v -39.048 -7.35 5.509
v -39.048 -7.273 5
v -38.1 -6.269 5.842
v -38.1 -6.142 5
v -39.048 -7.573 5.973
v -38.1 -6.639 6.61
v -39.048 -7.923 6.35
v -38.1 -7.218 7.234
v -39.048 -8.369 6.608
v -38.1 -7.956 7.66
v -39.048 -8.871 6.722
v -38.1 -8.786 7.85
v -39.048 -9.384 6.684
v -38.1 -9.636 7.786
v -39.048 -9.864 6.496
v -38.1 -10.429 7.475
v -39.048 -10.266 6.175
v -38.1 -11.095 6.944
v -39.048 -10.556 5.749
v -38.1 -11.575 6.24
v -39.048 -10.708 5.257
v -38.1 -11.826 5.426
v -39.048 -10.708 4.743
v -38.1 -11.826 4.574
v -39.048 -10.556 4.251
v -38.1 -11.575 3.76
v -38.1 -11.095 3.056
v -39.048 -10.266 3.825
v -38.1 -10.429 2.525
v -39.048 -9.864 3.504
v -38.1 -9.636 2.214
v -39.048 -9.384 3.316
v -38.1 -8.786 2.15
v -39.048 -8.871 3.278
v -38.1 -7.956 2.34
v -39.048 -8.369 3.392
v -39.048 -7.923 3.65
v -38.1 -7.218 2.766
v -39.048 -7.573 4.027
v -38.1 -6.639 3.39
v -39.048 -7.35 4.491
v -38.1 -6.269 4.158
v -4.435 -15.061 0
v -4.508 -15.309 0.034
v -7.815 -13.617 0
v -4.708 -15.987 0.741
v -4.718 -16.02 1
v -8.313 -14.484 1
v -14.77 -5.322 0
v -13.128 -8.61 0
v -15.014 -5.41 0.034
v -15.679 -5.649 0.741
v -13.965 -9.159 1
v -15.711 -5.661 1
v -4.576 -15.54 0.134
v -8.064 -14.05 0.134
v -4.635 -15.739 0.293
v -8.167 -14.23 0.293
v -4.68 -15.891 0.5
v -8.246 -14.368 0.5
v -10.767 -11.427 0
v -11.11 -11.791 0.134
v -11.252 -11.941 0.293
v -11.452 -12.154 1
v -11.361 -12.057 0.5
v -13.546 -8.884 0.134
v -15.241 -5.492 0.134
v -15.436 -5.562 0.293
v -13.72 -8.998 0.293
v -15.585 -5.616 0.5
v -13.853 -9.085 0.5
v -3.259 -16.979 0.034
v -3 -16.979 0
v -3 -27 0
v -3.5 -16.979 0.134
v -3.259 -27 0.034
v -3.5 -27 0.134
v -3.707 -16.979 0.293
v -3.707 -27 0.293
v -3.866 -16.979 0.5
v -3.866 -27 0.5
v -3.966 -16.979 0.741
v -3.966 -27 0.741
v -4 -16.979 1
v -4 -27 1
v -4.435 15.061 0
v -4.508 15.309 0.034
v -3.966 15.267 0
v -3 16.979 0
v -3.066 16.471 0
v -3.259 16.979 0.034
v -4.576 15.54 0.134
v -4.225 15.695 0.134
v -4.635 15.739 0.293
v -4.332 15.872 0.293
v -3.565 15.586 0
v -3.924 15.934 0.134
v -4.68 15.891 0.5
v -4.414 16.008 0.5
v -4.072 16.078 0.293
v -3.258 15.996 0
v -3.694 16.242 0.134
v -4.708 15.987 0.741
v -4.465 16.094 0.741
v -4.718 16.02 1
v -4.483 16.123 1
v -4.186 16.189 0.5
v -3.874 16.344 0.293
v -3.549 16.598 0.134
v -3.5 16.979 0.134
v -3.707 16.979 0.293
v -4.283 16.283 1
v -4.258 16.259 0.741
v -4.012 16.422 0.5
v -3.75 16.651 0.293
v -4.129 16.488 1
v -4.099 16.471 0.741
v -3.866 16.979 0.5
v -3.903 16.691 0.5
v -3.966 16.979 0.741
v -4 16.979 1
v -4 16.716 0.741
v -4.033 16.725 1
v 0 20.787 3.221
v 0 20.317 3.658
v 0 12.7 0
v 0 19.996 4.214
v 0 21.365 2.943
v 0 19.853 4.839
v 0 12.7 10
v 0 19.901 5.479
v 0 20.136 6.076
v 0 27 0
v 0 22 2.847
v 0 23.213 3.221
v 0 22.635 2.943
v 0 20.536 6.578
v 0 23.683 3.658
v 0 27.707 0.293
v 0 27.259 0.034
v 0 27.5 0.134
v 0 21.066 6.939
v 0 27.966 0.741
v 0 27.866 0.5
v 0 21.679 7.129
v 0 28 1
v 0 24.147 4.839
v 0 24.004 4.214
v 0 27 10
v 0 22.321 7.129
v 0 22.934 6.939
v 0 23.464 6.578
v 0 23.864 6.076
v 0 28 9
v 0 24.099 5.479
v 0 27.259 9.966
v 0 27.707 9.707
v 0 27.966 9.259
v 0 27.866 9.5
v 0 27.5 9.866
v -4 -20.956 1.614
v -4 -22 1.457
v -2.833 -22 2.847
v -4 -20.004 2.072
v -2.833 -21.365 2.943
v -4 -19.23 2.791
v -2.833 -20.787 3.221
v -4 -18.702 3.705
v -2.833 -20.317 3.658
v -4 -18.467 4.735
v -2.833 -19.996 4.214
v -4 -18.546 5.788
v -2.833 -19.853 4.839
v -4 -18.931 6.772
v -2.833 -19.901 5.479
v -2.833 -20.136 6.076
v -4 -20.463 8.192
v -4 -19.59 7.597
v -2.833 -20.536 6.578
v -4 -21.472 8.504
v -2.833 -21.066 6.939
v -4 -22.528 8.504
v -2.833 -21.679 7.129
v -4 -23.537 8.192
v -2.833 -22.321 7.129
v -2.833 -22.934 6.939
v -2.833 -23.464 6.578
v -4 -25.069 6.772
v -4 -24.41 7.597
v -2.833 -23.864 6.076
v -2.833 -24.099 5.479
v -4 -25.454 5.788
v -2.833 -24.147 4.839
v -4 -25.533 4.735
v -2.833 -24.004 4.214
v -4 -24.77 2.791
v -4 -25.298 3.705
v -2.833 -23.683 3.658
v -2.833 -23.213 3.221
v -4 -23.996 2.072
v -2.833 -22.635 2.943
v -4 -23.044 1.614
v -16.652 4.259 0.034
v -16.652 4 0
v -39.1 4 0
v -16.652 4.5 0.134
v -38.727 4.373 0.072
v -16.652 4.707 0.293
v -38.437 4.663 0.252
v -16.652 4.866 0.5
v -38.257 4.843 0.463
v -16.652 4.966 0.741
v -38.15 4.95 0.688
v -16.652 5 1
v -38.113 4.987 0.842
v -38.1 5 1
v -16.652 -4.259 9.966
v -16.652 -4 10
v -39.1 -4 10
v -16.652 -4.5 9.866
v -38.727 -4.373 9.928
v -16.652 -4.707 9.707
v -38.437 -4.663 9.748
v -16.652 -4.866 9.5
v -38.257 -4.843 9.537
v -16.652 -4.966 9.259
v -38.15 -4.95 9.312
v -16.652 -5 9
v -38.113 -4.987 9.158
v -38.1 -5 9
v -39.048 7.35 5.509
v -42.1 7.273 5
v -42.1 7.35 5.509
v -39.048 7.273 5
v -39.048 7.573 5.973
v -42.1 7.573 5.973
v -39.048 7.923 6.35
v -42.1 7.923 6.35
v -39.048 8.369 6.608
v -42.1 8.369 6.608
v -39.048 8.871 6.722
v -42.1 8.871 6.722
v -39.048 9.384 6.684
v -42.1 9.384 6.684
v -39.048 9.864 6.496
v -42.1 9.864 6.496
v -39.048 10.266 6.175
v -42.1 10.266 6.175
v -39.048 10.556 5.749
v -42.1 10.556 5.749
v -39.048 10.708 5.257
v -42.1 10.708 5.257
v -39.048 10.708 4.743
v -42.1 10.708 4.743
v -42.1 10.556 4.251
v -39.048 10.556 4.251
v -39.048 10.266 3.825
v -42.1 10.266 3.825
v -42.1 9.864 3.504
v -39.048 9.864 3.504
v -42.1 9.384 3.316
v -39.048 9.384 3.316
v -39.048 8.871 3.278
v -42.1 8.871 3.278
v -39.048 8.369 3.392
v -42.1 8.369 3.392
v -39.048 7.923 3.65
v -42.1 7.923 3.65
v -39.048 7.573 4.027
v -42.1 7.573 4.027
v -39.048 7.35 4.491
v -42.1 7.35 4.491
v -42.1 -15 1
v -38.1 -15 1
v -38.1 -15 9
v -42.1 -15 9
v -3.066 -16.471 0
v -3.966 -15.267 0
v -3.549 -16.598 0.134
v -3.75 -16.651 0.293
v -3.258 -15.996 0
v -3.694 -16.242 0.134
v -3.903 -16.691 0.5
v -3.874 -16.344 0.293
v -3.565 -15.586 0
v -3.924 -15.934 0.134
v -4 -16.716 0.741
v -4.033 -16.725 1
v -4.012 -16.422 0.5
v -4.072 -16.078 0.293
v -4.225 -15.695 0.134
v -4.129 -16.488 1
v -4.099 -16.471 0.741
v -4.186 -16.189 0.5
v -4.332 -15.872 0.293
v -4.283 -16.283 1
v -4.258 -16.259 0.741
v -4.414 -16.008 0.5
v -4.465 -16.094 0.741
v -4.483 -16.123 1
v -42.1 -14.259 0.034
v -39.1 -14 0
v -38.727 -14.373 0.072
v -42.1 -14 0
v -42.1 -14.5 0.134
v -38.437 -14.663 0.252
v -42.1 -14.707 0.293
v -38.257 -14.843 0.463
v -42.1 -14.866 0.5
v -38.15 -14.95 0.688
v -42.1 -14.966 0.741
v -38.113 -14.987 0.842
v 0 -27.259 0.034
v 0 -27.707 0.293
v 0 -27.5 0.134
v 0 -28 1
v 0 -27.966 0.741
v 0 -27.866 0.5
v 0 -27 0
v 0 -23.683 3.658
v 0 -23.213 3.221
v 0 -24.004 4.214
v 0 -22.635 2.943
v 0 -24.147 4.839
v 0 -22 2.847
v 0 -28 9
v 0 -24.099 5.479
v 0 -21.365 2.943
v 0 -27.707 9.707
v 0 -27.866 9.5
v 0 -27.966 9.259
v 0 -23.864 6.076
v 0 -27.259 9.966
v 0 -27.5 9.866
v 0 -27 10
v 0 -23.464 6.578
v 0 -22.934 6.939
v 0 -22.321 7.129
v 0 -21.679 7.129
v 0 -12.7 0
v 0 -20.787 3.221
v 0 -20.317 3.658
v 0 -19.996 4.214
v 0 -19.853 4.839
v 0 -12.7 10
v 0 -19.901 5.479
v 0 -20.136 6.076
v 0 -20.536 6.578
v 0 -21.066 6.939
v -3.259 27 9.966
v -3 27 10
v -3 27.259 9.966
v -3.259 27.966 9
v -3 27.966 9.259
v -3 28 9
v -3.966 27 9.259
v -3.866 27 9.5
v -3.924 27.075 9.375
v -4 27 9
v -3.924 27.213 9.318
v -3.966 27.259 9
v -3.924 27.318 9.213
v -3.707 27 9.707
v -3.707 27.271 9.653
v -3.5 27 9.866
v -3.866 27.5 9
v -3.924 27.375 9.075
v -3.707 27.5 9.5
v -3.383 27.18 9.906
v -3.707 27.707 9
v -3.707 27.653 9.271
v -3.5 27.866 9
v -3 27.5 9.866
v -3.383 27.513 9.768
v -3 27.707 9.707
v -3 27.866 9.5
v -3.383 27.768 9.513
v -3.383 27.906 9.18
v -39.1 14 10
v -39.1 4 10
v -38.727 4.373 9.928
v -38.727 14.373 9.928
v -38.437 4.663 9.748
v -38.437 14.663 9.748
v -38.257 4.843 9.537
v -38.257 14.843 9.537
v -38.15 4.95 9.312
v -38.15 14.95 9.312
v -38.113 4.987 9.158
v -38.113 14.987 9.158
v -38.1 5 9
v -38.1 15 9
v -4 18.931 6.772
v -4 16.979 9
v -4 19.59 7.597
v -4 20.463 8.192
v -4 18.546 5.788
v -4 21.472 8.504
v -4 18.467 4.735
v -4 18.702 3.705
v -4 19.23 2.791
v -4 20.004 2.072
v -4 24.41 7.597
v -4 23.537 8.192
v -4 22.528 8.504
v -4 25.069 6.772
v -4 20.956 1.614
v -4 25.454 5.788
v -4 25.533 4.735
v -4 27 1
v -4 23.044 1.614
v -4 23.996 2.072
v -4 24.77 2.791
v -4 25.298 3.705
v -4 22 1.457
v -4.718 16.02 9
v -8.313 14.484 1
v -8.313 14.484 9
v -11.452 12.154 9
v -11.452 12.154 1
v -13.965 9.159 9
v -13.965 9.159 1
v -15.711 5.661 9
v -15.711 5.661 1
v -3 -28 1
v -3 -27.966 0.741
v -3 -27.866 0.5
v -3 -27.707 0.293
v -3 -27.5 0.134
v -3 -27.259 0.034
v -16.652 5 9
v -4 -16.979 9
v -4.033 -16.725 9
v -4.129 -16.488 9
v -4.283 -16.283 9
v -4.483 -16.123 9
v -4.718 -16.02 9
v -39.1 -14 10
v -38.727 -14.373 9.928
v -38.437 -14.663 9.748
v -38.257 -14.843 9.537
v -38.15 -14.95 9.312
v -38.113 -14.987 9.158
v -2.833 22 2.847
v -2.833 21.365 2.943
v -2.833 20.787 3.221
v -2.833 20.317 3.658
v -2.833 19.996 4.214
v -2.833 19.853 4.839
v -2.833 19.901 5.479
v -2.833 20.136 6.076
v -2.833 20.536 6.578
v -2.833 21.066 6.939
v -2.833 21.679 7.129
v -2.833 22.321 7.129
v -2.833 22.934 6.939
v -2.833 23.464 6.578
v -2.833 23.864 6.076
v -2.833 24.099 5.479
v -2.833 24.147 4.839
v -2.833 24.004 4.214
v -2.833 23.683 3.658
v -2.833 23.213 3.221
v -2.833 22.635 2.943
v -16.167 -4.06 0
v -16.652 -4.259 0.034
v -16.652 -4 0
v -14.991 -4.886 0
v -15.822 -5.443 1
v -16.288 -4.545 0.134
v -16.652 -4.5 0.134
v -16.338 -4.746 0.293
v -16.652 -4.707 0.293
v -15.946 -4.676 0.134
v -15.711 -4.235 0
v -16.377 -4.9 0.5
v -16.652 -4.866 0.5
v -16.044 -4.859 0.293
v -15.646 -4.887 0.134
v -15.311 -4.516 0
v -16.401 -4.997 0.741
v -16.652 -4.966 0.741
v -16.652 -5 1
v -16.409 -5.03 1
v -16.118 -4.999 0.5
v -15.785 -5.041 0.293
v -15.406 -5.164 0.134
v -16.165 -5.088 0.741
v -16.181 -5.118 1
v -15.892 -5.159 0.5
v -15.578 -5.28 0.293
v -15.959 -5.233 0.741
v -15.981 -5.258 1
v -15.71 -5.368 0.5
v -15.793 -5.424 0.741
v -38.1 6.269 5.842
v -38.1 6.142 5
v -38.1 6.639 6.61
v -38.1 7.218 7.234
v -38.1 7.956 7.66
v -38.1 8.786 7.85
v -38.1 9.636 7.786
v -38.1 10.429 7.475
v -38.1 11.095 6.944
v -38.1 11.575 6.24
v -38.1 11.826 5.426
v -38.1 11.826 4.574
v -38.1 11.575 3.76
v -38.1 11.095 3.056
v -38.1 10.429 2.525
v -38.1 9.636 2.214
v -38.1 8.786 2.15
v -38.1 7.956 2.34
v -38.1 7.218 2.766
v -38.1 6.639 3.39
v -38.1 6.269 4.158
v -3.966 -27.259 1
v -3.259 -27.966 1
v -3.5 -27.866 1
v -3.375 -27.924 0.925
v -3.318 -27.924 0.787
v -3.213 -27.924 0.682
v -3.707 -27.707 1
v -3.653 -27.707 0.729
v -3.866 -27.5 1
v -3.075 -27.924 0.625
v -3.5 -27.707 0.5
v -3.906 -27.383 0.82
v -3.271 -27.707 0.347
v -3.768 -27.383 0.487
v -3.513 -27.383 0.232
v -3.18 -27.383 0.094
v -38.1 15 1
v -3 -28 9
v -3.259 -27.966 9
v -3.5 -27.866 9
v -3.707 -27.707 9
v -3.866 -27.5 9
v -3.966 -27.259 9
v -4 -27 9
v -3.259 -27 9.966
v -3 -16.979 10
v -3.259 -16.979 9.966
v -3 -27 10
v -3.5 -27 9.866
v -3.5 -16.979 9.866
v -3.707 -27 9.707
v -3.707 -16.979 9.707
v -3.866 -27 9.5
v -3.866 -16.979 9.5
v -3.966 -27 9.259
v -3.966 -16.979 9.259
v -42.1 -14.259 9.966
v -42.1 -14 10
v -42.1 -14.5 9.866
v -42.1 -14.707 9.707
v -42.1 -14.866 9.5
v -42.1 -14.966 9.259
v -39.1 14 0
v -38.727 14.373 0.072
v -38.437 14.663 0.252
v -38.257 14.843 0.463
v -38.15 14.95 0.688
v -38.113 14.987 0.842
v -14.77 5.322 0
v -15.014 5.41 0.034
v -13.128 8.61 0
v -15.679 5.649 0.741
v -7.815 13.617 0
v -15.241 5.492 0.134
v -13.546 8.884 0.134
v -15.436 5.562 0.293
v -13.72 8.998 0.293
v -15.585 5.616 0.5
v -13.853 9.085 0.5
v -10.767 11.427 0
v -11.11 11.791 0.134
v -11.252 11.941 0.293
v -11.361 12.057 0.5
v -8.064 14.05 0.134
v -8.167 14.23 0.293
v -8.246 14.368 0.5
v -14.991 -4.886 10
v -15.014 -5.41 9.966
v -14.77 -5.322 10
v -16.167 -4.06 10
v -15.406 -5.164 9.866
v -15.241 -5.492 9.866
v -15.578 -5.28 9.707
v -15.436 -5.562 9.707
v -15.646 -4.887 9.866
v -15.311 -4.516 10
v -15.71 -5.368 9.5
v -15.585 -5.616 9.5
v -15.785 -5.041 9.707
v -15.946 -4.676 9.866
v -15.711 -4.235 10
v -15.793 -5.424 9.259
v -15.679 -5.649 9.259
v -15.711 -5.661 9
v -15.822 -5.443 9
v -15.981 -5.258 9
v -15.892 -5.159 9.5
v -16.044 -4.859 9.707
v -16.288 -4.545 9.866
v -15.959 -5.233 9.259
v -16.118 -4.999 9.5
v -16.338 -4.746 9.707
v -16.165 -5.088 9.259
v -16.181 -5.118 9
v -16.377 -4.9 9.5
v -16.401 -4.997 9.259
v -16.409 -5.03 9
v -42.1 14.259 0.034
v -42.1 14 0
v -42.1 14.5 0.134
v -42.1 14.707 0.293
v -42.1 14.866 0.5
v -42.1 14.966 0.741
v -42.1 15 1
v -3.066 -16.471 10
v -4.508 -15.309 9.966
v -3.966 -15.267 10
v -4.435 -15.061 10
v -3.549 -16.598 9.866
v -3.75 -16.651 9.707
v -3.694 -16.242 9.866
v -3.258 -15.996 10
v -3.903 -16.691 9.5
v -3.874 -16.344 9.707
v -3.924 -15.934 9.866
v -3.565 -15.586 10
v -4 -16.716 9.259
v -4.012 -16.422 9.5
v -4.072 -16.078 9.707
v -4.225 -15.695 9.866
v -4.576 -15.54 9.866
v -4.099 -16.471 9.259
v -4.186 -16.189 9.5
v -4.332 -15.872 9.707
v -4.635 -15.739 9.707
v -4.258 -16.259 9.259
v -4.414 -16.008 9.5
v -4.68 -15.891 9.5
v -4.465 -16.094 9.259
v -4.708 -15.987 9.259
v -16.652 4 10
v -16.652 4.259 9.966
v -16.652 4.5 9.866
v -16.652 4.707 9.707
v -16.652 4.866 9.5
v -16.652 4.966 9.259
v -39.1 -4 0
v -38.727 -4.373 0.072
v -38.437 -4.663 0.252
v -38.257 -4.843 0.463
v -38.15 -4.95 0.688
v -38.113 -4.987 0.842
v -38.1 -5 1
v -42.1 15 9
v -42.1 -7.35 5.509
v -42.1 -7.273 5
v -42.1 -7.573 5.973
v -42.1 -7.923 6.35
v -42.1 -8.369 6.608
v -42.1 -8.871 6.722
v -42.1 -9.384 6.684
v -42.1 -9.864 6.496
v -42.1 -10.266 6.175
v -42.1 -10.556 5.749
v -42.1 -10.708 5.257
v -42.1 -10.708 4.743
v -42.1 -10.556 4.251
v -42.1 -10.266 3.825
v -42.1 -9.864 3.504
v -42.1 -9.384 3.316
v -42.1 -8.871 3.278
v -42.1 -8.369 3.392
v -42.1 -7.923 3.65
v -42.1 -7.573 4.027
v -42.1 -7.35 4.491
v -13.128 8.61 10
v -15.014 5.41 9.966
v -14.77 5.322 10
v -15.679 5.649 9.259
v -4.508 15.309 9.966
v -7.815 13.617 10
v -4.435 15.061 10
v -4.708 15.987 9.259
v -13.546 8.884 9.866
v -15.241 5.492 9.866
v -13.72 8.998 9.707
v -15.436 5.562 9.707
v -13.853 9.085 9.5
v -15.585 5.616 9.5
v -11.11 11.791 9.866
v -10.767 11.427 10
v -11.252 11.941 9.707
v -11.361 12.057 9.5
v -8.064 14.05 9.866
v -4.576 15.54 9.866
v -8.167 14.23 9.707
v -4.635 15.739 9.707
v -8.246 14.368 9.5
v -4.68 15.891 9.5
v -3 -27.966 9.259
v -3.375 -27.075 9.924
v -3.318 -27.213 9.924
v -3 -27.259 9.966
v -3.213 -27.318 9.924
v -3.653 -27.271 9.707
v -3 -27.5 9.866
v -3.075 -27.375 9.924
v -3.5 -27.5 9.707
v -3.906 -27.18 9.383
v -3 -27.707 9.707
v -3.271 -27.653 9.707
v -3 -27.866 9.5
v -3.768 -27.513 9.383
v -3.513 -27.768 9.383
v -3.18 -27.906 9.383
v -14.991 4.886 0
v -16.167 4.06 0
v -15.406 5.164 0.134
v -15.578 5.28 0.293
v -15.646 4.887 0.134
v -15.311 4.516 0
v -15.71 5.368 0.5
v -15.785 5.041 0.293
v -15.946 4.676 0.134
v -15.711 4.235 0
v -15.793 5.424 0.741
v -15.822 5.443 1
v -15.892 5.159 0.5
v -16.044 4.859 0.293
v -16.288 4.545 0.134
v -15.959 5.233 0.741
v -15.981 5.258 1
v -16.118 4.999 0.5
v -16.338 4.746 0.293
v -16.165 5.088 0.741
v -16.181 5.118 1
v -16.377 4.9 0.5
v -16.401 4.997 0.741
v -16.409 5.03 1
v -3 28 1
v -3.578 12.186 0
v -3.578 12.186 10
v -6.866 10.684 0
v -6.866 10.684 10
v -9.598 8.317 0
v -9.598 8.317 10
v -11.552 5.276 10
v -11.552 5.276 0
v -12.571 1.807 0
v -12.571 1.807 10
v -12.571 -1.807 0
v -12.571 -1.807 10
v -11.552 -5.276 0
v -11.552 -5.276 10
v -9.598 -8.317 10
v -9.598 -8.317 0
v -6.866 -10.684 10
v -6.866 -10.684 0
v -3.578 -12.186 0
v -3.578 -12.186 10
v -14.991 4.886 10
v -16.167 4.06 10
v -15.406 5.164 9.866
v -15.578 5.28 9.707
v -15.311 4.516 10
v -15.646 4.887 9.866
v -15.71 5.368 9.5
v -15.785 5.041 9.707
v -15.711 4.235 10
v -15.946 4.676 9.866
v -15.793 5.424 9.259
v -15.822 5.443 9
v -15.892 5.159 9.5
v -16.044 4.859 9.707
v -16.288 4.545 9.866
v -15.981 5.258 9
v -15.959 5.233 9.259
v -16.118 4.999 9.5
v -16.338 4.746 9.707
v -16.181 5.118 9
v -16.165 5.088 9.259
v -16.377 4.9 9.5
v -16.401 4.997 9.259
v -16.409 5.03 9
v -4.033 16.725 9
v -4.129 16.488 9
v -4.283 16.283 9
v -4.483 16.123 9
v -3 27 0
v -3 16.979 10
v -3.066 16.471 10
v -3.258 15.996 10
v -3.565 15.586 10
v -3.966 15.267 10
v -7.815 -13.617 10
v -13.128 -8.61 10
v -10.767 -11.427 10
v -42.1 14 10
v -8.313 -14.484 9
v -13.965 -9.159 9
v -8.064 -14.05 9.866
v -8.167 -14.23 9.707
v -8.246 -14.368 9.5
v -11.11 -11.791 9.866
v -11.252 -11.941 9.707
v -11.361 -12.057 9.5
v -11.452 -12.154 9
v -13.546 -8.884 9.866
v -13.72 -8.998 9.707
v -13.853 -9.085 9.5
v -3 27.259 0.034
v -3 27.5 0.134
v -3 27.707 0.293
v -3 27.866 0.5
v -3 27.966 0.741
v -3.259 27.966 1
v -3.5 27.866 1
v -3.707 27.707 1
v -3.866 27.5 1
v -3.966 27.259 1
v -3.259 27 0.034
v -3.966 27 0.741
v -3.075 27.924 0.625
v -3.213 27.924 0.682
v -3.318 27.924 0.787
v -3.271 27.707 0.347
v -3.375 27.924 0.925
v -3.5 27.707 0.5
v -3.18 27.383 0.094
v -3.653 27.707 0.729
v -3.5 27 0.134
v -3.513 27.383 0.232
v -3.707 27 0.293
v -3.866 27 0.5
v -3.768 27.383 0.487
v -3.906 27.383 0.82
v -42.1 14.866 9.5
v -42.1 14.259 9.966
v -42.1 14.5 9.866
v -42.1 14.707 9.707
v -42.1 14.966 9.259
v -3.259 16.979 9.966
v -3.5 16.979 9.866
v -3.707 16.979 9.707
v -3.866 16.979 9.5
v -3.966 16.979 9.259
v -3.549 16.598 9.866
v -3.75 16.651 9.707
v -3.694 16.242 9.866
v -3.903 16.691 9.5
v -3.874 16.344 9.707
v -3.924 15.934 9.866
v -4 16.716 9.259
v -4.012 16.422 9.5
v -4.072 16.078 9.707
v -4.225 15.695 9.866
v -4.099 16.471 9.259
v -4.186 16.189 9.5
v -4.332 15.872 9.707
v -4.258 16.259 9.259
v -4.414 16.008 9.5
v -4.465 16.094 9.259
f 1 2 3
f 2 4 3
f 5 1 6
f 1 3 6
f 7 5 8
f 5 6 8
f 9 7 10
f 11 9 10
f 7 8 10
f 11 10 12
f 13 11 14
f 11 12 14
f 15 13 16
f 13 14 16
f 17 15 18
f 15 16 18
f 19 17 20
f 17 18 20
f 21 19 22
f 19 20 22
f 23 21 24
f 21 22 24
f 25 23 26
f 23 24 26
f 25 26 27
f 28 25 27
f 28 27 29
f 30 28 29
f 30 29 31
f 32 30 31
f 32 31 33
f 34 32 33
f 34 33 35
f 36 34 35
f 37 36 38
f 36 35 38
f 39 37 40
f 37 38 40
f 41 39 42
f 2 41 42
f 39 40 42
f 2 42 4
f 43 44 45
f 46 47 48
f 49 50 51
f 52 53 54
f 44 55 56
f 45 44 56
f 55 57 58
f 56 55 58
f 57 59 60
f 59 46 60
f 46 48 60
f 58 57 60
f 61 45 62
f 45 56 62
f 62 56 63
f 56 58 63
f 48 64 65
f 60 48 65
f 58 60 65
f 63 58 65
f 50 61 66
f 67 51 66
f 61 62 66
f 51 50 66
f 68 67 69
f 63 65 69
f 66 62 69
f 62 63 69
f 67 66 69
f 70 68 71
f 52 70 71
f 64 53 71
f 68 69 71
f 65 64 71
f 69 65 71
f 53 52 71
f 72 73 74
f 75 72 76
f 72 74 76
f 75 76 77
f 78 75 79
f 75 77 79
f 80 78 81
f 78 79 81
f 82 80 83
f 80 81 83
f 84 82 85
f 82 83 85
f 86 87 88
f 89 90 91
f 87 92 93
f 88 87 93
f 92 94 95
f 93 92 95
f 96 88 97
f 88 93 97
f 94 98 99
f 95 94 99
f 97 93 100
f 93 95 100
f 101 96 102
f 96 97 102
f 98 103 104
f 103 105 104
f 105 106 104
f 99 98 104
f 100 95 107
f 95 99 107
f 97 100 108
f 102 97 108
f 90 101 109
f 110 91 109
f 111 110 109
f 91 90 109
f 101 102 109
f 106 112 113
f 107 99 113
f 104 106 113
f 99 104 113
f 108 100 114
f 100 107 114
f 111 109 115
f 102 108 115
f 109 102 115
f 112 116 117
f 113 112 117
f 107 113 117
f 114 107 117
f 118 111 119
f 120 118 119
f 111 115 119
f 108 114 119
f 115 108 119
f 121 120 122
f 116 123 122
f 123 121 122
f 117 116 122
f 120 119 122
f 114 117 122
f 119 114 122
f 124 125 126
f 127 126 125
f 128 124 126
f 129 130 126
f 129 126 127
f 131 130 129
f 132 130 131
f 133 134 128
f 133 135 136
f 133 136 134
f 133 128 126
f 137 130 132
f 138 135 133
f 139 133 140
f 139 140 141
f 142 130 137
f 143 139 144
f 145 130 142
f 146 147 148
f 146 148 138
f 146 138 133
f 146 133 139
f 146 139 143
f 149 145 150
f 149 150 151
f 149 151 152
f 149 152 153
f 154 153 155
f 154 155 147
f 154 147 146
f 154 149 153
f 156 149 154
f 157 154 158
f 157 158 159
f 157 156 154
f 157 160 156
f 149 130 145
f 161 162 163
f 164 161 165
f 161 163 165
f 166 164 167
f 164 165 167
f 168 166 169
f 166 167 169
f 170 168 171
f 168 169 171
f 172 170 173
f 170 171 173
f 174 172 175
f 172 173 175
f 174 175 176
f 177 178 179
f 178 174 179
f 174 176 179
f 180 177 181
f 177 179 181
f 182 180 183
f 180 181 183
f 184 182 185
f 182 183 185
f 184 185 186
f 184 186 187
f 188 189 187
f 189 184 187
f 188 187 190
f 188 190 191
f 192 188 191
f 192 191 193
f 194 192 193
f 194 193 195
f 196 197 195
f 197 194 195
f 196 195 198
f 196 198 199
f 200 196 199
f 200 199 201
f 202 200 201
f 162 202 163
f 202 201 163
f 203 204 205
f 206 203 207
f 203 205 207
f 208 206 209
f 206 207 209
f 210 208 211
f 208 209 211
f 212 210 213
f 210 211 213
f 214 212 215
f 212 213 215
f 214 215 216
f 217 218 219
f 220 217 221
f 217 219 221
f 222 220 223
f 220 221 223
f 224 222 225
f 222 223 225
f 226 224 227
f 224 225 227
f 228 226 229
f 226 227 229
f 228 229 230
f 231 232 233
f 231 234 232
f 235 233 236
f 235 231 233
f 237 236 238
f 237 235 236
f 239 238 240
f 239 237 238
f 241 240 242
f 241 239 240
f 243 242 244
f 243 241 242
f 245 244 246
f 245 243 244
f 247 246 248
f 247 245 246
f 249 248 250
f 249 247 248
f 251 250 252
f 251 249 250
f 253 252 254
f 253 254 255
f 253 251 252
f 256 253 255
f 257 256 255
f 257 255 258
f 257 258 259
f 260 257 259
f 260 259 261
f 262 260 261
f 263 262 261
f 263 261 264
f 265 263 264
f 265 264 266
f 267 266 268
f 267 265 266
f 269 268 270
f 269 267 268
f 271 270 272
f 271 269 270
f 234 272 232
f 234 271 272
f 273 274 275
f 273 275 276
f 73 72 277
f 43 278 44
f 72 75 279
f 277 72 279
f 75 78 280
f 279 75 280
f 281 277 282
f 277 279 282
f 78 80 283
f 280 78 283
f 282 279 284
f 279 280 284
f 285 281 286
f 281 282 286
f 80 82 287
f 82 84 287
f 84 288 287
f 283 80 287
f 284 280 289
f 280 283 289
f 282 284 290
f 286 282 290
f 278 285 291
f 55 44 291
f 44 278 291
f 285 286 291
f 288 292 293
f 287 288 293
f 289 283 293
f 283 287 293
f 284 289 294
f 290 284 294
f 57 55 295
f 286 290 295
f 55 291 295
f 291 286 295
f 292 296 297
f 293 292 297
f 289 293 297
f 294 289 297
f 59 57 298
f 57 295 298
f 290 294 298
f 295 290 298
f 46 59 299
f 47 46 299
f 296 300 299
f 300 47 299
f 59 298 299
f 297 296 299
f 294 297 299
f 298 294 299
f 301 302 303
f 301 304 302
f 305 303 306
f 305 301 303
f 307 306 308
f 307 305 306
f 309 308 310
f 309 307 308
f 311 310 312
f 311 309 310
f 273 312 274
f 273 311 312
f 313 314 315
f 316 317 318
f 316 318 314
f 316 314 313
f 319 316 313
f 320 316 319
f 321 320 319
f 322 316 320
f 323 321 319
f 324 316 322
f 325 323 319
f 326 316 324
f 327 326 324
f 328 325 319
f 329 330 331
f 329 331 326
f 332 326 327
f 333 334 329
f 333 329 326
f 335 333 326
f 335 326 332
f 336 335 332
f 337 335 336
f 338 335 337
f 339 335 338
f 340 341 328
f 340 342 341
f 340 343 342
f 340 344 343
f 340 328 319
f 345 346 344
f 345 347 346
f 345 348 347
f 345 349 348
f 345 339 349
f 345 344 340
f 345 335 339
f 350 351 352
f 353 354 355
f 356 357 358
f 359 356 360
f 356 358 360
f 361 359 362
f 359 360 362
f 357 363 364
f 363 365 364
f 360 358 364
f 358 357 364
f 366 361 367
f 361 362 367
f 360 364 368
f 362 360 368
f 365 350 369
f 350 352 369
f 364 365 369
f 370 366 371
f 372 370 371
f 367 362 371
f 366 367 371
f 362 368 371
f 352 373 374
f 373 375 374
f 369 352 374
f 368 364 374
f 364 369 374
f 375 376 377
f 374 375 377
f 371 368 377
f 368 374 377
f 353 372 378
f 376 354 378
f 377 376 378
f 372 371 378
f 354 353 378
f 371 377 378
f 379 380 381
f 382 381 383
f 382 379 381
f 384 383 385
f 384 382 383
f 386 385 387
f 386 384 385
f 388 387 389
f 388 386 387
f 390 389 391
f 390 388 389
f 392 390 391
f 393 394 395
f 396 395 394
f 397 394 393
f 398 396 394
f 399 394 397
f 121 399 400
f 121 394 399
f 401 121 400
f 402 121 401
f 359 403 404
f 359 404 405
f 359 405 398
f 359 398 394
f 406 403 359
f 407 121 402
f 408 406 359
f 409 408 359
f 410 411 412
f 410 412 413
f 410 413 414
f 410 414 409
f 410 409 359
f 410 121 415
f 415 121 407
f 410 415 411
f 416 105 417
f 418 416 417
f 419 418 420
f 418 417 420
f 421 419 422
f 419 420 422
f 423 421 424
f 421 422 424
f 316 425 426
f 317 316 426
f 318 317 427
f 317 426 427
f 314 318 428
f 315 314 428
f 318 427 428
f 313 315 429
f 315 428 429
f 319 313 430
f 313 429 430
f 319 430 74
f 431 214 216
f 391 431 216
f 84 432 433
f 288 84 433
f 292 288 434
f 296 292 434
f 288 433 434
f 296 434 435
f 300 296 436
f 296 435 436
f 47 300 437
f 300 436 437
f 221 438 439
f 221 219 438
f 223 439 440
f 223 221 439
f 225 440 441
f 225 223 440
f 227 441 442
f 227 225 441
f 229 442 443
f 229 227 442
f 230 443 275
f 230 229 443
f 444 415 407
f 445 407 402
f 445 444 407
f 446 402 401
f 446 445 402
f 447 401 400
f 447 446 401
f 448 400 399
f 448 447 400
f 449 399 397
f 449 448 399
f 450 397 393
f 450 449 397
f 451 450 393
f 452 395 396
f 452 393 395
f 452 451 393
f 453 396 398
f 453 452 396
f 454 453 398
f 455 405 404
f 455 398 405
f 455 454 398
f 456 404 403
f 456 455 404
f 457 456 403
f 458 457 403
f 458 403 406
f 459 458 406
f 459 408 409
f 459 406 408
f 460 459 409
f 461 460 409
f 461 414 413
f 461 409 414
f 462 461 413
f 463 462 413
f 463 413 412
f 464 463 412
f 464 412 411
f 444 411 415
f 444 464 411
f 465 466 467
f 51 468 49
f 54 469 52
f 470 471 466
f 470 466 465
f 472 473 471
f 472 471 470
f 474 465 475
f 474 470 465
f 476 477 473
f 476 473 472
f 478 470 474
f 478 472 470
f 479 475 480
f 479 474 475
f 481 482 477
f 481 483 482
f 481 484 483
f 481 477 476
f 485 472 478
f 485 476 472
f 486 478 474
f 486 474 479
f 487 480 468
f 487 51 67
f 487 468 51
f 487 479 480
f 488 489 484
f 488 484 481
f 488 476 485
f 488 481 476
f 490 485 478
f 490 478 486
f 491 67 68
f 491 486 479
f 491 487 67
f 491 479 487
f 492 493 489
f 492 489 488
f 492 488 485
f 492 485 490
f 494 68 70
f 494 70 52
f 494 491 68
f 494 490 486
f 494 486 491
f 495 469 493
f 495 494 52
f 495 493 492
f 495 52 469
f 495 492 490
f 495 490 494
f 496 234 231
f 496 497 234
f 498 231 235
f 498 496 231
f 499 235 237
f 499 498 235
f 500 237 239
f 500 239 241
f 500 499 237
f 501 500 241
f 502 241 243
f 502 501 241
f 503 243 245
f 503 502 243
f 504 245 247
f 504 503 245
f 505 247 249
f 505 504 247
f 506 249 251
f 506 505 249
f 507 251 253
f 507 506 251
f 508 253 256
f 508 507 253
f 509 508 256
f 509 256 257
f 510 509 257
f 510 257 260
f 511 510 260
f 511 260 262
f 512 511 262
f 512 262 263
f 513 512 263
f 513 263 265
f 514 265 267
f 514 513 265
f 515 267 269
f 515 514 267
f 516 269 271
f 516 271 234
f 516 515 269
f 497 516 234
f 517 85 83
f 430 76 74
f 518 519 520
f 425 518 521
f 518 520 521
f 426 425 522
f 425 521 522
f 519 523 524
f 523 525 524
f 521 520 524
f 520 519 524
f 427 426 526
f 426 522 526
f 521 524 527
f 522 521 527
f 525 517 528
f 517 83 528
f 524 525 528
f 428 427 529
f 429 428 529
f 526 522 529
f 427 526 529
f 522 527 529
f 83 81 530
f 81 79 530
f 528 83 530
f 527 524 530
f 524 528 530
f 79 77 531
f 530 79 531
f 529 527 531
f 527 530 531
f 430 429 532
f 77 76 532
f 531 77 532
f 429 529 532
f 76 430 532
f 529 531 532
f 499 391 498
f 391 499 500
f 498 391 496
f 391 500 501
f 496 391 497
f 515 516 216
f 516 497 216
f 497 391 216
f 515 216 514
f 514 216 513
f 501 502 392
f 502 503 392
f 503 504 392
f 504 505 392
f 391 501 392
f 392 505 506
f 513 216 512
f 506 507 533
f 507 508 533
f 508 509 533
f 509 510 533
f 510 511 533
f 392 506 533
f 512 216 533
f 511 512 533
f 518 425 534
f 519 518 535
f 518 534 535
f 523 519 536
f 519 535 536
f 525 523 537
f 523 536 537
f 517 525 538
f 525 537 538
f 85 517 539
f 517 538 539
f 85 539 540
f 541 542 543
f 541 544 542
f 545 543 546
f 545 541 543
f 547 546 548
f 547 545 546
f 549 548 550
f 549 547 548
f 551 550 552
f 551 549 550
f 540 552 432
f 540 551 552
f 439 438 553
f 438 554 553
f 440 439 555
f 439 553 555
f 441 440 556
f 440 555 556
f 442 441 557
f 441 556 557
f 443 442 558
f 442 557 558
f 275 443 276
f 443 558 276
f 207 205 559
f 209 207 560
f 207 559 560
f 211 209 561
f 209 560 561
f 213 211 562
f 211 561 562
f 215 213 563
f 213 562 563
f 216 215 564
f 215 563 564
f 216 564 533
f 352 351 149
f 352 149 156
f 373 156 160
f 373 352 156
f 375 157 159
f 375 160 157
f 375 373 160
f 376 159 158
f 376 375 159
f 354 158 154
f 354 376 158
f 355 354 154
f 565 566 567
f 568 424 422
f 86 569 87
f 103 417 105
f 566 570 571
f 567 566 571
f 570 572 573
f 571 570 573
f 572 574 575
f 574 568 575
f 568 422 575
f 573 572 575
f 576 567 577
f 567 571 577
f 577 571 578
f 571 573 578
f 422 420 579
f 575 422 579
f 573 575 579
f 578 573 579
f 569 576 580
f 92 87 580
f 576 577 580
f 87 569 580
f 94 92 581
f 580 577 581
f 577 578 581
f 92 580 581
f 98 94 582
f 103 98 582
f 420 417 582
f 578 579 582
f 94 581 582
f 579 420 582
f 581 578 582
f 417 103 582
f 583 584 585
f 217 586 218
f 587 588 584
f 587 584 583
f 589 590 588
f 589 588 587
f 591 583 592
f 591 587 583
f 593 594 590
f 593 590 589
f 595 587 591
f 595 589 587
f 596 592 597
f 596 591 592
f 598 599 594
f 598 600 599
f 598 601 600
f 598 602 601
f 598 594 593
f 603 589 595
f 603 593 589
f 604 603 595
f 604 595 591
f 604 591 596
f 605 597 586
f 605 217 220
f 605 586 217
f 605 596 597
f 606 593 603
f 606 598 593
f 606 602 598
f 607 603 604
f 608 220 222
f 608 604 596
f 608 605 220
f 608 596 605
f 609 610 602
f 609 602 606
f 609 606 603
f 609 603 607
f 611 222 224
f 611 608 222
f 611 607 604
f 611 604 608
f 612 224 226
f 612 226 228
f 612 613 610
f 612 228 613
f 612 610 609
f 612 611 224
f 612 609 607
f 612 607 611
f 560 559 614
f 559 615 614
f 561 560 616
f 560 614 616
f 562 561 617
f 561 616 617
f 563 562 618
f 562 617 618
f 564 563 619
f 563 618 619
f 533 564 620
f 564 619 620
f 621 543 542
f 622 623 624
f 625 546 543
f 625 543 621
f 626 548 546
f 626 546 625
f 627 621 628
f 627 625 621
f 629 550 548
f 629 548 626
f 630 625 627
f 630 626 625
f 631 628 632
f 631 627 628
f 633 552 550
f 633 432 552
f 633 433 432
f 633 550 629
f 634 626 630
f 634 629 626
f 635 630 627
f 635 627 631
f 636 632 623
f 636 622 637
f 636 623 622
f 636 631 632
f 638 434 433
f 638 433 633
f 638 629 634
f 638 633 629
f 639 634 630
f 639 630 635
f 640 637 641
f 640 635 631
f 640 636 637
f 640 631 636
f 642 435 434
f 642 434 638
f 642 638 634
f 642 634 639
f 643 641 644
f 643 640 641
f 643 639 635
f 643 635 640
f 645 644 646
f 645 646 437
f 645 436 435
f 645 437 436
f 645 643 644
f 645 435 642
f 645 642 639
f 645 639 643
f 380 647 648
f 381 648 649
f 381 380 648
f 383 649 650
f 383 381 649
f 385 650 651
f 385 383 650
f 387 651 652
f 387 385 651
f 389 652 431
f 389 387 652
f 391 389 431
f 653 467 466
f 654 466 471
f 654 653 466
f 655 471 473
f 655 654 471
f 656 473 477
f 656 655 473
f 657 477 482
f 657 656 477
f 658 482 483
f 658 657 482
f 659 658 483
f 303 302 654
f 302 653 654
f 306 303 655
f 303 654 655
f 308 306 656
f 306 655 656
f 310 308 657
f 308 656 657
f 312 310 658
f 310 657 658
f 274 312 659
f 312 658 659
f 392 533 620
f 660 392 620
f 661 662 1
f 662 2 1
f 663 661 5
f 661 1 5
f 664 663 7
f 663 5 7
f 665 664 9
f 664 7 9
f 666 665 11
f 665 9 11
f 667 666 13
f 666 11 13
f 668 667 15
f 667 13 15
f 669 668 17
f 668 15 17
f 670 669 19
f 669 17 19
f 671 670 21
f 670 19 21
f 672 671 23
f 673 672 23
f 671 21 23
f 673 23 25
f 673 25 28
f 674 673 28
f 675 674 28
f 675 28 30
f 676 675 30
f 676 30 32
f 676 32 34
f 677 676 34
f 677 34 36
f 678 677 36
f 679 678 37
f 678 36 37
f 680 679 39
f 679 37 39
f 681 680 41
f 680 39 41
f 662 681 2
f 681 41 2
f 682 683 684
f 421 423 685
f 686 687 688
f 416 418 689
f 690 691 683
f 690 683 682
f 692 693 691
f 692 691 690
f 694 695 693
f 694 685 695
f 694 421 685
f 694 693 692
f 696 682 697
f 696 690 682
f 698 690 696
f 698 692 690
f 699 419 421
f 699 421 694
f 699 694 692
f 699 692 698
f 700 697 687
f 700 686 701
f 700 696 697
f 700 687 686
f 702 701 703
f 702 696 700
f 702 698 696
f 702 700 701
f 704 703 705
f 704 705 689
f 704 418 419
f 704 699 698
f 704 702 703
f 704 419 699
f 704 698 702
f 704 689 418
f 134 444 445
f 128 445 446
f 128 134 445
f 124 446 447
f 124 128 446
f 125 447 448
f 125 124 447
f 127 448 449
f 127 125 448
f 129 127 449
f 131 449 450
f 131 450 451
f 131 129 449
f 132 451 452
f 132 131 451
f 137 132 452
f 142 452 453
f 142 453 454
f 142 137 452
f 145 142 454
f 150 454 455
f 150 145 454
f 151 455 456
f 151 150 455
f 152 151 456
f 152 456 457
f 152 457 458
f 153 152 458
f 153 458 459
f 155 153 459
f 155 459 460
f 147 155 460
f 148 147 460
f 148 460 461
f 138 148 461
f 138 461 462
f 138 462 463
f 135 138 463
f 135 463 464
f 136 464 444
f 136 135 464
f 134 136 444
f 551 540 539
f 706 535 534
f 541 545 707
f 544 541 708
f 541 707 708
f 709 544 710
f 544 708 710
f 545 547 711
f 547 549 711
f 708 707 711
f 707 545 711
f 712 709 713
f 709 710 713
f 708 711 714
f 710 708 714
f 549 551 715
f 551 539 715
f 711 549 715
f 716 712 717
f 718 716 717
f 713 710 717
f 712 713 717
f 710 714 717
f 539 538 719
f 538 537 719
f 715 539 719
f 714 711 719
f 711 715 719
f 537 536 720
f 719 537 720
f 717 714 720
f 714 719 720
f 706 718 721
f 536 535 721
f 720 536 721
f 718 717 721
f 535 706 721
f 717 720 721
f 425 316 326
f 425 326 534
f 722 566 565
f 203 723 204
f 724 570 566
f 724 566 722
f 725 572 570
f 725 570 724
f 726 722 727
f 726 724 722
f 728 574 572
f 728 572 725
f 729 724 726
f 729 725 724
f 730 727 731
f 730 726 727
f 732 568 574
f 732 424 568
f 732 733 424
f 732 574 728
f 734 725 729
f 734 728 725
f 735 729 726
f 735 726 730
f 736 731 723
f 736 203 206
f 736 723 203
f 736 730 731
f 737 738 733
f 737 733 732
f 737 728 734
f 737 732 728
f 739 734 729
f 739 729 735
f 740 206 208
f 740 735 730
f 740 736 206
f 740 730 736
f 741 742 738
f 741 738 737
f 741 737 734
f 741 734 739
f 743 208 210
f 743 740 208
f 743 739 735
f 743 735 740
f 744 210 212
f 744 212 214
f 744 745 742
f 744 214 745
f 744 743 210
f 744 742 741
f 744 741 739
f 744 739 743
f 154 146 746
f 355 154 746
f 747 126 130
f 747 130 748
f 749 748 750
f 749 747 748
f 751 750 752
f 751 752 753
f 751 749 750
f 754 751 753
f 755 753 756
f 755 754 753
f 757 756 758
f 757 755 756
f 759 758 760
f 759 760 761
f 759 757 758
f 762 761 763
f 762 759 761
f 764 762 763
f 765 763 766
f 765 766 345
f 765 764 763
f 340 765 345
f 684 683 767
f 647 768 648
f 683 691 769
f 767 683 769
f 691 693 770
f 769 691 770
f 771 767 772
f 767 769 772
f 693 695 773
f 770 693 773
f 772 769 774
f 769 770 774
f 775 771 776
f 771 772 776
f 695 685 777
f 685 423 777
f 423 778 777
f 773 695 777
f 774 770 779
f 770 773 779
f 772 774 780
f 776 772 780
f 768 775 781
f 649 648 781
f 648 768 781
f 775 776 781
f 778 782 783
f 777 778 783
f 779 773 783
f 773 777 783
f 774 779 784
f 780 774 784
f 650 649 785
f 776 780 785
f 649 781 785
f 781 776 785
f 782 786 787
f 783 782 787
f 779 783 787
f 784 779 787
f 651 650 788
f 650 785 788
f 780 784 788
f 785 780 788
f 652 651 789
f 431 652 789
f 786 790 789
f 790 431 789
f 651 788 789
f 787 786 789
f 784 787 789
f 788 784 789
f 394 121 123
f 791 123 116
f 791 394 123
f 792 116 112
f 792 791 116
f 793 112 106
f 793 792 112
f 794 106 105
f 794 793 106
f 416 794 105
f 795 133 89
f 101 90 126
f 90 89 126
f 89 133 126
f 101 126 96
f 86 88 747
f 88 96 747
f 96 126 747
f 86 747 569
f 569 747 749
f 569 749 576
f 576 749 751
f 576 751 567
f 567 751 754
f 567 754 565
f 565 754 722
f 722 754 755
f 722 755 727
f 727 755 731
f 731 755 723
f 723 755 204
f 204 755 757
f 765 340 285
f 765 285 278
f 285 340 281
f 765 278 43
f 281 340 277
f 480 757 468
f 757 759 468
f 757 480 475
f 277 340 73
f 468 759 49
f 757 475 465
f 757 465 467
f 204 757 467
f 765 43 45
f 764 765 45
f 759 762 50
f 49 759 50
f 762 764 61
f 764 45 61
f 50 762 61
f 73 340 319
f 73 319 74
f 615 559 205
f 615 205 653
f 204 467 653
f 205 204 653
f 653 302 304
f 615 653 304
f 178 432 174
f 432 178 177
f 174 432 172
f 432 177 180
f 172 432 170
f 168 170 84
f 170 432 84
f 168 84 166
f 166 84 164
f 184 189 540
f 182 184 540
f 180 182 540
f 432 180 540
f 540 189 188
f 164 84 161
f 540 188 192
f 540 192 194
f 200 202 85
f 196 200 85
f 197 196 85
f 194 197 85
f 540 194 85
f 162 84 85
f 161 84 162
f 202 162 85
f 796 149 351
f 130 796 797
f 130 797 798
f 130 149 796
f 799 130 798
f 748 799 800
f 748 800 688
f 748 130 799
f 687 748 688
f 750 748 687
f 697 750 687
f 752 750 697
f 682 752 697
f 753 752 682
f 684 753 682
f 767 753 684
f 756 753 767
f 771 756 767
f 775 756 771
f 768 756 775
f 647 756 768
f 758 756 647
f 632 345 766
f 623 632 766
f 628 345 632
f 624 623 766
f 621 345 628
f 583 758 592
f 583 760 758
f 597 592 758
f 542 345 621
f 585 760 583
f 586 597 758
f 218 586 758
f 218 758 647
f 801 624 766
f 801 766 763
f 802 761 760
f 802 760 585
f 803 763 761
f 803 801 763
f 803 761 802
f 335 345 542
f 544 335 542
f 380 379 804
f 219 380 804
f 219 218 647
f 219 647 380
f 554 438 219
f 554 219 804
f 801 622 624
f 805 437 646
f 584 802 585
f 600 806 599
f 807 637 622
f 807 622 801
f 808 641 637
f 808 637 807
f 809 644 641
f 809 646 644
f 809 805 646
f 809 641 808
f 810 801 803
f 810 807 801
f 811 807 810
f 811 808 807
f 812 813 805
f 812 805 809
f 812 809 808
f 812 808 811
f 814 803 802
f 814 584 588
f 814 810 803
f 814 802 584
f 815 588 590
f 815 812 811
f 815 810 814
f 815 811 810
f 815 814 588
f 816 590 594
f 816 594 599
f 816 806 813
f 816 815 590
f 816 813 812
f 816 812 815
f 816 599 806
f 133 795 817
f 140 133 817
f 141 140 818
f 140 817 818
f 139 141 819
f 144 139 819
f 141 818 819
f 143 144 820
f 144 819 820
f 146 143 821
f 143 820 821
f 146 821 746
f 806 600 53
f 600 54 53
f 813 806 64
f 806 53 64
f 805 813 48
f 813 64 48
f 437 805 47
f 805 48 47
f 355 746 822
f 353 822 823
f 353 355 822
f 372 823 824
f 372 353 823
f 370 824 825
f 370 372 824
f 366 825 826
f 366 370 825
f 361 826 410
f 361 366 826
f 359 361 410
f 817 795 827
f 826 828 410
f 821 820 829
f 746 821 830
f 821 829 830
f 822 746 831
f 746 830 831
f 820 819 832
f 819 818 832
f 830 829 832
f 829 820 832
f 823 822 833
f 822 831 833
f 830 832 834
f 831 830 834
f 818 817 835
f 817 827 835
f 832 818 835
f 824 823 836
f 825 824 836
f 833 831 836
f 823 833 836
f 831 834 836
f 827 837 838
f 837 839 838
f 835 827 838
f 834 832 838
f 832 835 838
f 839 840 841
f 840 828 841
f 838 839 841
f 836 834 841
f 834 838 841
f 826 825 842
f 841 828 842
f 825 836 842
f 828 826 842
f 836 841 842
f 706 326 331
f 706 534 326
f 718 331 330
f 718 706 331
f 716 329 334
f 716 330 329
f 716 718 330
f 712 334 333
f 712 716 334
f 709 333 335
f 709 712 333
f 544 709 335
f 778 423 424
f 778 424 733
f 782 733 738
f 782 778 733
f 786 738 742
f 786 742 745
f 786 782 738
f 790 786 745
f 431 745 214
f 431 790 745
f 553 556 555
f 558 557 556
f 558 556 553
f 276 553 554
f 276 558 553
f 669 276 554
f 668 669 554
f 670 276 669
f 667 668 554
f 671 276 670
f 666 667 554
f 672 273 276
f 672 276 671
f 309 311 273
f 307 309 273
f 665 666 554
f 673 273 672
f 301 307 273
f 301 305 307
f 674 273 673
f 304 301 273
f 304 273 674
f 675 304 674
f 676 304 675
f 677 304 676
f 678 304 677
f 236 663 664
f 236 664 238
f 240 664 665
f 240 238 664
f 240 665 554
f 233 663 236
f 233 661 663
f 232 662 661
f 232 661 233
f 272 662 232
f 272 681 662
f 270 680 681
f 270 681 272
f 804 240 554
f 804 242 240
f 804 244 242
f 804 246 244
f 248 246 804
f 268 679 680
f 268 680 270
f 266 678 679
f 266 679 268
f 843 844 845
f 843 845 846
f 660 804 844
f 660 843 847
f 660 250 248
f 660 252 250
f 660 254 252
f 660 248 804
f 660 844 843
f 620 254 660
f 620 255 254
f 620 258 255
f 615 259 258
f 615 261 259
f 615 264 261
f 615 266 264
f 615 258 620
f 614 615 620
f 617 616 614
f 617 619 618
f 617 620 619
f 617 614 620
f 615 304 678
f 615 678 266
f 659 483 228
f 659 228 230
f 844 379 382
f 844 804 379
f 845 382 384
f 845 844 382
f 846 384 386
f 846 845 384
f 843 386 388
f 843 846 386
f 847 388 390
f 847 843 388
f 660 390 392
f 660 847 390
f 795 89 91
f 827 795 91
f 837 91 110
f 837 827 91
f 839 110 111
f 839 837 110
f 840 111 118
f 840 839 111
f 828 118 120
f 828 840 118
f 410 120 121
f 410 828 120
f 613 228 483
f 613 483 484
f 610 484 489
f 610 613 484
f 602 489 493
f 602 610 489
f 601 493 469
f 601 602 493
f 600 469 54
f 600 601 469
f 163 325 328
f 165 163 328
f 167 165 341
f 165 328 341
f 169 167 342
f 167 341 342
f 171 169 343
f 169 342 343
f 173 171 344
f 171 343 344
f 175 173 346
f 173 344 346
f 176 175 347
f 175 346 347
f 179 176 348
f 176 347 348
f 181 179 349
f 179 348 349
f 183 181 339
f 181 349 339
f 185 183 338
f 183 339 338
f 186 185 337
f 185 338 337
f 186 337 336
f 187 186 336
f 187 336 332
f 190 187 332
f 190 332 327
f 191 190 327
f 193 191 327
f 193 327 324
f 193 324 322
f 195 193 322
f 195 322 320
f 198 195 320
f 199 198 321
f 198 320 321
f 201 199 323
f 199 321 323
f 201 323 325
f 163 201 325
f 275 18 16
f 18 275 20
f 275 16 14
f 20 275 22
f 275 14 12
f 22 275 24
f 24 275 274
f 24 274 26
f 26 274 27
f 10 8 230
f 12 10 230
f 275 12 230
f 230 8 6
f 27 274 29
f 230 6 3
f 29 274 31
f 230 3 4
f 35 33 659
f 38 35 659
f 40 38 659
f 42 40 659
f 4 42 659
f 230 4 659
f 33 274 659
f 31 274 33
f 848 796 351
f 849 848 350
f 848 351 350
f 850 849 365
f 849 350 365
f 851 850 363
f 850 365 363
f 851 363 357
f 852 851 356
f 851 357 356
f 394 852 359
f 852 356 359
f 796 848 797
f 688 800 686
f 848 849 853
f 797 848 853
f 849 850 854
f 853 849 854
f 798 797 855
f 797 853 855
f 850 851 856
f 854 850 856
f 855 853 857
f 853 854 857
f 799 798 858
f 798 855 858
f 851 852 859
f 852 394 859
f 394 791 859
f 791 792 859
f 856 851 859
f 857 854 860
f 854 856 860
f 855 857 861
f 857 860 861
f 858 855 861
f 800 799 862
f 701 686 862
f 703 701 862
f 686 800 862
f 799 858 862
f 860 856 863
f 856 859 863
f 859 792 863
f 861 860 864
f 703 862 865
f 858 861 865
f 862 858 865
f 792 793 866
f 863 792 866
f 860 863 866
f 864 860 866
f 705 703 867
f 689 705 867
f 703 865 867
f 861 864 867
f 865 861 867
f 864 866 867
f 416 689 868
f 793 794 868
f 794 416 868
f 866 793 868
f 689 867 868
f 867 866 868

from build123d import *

# Parameters (mm, degrees)
SKETCH1_R                                         = 16.7
SKETCH1_R_2                                       = 12.7
BOSS_EXTRUDE1_DEPTH                               = 10
SKETCH2_W                                         = 22.16607393
SKETCH2_H                                         = 10
SKETCH2_W_2                                       = 4
SKETCH2_H_2                                       = 30
BOSS_EXTRUDE2_DEPTH                               = 10
SKETCH4_W                                         = 8
SKETCH4_H                                         = 11.78611706
BOSS_EXTRUDE3_DEPTH                               = 10
FILLET3_R                                         = 1
CSK_FOR_6_FLAT_HEAD_MACHINE_SCREW_100_D           = 4.3053
CSK_FOR_6_FLAT_HEAD_MACHINE_SCREW_100_CSINK_D     = 7.0866
CSK_FOR_6_FLAT_HEAD_MACHINE_SCREW_100_CSINK_ANGLE = 100
INTERSECT3_OUTLINE_R                              = 2.15265
INTERSECT3_DEPTH                                  = 16.7


# Read off the part's stored shape, not the designer's step: CSK for #4 Flat Head Machine Screw (100)1, Intersect3
with BuildPart() as part:
    # Sketch1 → Boss-Extrude1 (new body)
    with BuildSketch(Plane.XY):
        Circle(SKETCH1_R)
        Circle(SKETCH1_R_2, mode=Mode.SUBTRACT)
    extrude(amount=BOSS_EXTRUDE1_DEPTH)

    # Sketch2 → Boss-Extrude2 (add)
    with BuildSketch(Plane(origin=(0, 0, 0), x_dir=(-1, 0, 0), z_dir=(0, 0, -1))):
        with Locations((27.016963035, 0)):
            Rectangle(SKETCH2_W, SKETCH2_H)
        with Locations((40.1, 0)):
            Rectangle(SKETCH2_W_2, SKETCH2_H_2)
    extrude(amount=-BOSS_EXTRUDE2_DEPTH)

    # Sketch4 → Boss-Extrude3 (add)
    with BuildSketch(Plane(origin=(0, 0, 0), x_dir=(-1, 0, 0), z_dir=(0, 0, -1))):
        with Locations((0, 22.10694147)):
            Rectangle(SKETCH4_W, SKETCH4_H)
    boss_extrude3 = extrude(amount=-BOSS_EXTRUDE3_DEPTH)

    # Mirror1: Boss-Extrude3 across plane
    add(boss_extrude3.mirror(Plane.ZX))

    # Fillet3
    fillet3_edges = [part.edges().sort_by_distance(p)[0] for p in [
        (-11.435827246, -12.170121413, 10),
        (-11.435827246, -12.170121413, 0),
        (-38.1, 10, 10),
        (-40.1, -15, 10),
        (-27.016963035, -5, 10),
        (-38.1, -10, 0),
        (-40.1, 15, 0),
        (-38.1, 10, 0),
        (-27.016963035, 5, 0),
        (-38.1, -10, 10),
        (-40.1, -15, 0),
        (-40.1, 15, 10),
        (-15.93392607, -5, 5),
        (-27.016963035, -5, 0),
        (-27.016963035, 5, 10),
        (-15.93392607, 5, 5),
        (-11.435827246, 12.170121413, 0),
        (-11.435827246, 12.170121413, 10),
        (-4, 22.10694147, 0),
        (0, 28, 0),
        (4, 22.10694147, 0),
        (0, 28, 10),
        (4, 28, 5),
        (4, 22.10694147, 10),
        (4, 16.21388294, 5),
        (-4, 16.21388294, 5),
        (-4, 22.10694147, 10),
        (-4, 28, 5),
        (16.7, 0, 0),
        (16.7, 0, 10),
        (-4, -16.21388294, 5),
        (-4, -22.10694147, 0),
        (-4, -28, 5),
        (0, -28, 0),
        (4, -28, 5),
        (4, -22.10694147, 0),
        (4, -16.21388294, 5),
        (-4, -22.10694147, 10),
        (0, -28, 10),
        (4, -22.10694147, 10),
    ]]
    fillet(fillet3_edges, radius=FILLET3_R)

    # CSK for _4 Flat Head Machine Screw _ 2 → CSK for #4 Flat Head Machine Screw (100)1 (revolve, cut)
    with BuildSketch(Plane(origin=(0, -9, 5), x_dir=(0, 1, 0), z_dir=(0, 0, -1))):
        Polygon((0, -42.1), (1.7272, -42.1), (1.7272, -39.048434313), (2.8575, -38.1), (0, -38.1), align=None)
    csk_for_4_flat_head_machine_screw_100 = revolve(axis=Axis((0, -9, 5), (1, 0, 0)), mode=Mode.SUBTRACT)

    # Mirror2: CSK for #4 Flat Head Machine Screw (100)1 across plane
    add(csk_for_4_flat_head_machine_screw_100.mirror(Plane.ZX), mode=Mode.SUBTRACT)

    # CSK for #6 Flat Head Machine Screw (100)5 (through all)
    with Locations(Plane.ZY.offset(4)):
        with Locations((5, -22)):
            csk_for_6_flat_head_machine_screw_100 = CounterSinkHole(CSK_FOR_6_FLAT_HEAD_MACHINE_SCREW_100_D / 2, CSK_FOR_6_FLAT_HEAD_MACHINE_SCREW_100_CSINK_D / 2, counter_sink_angle=CSK_FOR_6_FLAT_HEAD_MACHINE_SCREW_100_CSINK_ANGLE)

    # Mirror5: CSK for #6 Flat Head Machine Screw (100)5 across plane
    add(csk_for_6_flat_head_machine_screw_100.mirror(Plane.ZX), mode=Mode.SUBTRACT)

    # Intersect3 outline → Intersect3 (cut)
    with BuildSketch(Plane.YZ):
        with BuildLine():
            ThreePointArc((28, 9), (27.707106781, 9.707106781), (27, 10))
            Line((27, 10), (-27, 10))
            ThreePointArc((-27, 10), (-27.707106781, 9.707106781), (-28, 9))
            Line((-28, 9), (-28, 1))
            ThreePointArc((-28, 1), (-27.707106781, 0.292893219), (-27, 0))
            Line((-27, 0), (27, 0))
            ThreePointArc((27, 0), (27.707106781, 0.292893219), (28, 1))
            Line((28, 1), (28, 9))
        make_face()
        with Locations((-22, 5)):
            Circle(INTERSECT3_OUTLINE_R, mode=Mode.SUBTRACT)
        with Locations((22, 5)):
            Circle(INTERSECT3_OUTLINE_R, mode=Mode.SUBTRACT)
    extrude(amount=INTERSECT3_DEPTH, mode=Mode.SUBTRACT)


solid = part.part
